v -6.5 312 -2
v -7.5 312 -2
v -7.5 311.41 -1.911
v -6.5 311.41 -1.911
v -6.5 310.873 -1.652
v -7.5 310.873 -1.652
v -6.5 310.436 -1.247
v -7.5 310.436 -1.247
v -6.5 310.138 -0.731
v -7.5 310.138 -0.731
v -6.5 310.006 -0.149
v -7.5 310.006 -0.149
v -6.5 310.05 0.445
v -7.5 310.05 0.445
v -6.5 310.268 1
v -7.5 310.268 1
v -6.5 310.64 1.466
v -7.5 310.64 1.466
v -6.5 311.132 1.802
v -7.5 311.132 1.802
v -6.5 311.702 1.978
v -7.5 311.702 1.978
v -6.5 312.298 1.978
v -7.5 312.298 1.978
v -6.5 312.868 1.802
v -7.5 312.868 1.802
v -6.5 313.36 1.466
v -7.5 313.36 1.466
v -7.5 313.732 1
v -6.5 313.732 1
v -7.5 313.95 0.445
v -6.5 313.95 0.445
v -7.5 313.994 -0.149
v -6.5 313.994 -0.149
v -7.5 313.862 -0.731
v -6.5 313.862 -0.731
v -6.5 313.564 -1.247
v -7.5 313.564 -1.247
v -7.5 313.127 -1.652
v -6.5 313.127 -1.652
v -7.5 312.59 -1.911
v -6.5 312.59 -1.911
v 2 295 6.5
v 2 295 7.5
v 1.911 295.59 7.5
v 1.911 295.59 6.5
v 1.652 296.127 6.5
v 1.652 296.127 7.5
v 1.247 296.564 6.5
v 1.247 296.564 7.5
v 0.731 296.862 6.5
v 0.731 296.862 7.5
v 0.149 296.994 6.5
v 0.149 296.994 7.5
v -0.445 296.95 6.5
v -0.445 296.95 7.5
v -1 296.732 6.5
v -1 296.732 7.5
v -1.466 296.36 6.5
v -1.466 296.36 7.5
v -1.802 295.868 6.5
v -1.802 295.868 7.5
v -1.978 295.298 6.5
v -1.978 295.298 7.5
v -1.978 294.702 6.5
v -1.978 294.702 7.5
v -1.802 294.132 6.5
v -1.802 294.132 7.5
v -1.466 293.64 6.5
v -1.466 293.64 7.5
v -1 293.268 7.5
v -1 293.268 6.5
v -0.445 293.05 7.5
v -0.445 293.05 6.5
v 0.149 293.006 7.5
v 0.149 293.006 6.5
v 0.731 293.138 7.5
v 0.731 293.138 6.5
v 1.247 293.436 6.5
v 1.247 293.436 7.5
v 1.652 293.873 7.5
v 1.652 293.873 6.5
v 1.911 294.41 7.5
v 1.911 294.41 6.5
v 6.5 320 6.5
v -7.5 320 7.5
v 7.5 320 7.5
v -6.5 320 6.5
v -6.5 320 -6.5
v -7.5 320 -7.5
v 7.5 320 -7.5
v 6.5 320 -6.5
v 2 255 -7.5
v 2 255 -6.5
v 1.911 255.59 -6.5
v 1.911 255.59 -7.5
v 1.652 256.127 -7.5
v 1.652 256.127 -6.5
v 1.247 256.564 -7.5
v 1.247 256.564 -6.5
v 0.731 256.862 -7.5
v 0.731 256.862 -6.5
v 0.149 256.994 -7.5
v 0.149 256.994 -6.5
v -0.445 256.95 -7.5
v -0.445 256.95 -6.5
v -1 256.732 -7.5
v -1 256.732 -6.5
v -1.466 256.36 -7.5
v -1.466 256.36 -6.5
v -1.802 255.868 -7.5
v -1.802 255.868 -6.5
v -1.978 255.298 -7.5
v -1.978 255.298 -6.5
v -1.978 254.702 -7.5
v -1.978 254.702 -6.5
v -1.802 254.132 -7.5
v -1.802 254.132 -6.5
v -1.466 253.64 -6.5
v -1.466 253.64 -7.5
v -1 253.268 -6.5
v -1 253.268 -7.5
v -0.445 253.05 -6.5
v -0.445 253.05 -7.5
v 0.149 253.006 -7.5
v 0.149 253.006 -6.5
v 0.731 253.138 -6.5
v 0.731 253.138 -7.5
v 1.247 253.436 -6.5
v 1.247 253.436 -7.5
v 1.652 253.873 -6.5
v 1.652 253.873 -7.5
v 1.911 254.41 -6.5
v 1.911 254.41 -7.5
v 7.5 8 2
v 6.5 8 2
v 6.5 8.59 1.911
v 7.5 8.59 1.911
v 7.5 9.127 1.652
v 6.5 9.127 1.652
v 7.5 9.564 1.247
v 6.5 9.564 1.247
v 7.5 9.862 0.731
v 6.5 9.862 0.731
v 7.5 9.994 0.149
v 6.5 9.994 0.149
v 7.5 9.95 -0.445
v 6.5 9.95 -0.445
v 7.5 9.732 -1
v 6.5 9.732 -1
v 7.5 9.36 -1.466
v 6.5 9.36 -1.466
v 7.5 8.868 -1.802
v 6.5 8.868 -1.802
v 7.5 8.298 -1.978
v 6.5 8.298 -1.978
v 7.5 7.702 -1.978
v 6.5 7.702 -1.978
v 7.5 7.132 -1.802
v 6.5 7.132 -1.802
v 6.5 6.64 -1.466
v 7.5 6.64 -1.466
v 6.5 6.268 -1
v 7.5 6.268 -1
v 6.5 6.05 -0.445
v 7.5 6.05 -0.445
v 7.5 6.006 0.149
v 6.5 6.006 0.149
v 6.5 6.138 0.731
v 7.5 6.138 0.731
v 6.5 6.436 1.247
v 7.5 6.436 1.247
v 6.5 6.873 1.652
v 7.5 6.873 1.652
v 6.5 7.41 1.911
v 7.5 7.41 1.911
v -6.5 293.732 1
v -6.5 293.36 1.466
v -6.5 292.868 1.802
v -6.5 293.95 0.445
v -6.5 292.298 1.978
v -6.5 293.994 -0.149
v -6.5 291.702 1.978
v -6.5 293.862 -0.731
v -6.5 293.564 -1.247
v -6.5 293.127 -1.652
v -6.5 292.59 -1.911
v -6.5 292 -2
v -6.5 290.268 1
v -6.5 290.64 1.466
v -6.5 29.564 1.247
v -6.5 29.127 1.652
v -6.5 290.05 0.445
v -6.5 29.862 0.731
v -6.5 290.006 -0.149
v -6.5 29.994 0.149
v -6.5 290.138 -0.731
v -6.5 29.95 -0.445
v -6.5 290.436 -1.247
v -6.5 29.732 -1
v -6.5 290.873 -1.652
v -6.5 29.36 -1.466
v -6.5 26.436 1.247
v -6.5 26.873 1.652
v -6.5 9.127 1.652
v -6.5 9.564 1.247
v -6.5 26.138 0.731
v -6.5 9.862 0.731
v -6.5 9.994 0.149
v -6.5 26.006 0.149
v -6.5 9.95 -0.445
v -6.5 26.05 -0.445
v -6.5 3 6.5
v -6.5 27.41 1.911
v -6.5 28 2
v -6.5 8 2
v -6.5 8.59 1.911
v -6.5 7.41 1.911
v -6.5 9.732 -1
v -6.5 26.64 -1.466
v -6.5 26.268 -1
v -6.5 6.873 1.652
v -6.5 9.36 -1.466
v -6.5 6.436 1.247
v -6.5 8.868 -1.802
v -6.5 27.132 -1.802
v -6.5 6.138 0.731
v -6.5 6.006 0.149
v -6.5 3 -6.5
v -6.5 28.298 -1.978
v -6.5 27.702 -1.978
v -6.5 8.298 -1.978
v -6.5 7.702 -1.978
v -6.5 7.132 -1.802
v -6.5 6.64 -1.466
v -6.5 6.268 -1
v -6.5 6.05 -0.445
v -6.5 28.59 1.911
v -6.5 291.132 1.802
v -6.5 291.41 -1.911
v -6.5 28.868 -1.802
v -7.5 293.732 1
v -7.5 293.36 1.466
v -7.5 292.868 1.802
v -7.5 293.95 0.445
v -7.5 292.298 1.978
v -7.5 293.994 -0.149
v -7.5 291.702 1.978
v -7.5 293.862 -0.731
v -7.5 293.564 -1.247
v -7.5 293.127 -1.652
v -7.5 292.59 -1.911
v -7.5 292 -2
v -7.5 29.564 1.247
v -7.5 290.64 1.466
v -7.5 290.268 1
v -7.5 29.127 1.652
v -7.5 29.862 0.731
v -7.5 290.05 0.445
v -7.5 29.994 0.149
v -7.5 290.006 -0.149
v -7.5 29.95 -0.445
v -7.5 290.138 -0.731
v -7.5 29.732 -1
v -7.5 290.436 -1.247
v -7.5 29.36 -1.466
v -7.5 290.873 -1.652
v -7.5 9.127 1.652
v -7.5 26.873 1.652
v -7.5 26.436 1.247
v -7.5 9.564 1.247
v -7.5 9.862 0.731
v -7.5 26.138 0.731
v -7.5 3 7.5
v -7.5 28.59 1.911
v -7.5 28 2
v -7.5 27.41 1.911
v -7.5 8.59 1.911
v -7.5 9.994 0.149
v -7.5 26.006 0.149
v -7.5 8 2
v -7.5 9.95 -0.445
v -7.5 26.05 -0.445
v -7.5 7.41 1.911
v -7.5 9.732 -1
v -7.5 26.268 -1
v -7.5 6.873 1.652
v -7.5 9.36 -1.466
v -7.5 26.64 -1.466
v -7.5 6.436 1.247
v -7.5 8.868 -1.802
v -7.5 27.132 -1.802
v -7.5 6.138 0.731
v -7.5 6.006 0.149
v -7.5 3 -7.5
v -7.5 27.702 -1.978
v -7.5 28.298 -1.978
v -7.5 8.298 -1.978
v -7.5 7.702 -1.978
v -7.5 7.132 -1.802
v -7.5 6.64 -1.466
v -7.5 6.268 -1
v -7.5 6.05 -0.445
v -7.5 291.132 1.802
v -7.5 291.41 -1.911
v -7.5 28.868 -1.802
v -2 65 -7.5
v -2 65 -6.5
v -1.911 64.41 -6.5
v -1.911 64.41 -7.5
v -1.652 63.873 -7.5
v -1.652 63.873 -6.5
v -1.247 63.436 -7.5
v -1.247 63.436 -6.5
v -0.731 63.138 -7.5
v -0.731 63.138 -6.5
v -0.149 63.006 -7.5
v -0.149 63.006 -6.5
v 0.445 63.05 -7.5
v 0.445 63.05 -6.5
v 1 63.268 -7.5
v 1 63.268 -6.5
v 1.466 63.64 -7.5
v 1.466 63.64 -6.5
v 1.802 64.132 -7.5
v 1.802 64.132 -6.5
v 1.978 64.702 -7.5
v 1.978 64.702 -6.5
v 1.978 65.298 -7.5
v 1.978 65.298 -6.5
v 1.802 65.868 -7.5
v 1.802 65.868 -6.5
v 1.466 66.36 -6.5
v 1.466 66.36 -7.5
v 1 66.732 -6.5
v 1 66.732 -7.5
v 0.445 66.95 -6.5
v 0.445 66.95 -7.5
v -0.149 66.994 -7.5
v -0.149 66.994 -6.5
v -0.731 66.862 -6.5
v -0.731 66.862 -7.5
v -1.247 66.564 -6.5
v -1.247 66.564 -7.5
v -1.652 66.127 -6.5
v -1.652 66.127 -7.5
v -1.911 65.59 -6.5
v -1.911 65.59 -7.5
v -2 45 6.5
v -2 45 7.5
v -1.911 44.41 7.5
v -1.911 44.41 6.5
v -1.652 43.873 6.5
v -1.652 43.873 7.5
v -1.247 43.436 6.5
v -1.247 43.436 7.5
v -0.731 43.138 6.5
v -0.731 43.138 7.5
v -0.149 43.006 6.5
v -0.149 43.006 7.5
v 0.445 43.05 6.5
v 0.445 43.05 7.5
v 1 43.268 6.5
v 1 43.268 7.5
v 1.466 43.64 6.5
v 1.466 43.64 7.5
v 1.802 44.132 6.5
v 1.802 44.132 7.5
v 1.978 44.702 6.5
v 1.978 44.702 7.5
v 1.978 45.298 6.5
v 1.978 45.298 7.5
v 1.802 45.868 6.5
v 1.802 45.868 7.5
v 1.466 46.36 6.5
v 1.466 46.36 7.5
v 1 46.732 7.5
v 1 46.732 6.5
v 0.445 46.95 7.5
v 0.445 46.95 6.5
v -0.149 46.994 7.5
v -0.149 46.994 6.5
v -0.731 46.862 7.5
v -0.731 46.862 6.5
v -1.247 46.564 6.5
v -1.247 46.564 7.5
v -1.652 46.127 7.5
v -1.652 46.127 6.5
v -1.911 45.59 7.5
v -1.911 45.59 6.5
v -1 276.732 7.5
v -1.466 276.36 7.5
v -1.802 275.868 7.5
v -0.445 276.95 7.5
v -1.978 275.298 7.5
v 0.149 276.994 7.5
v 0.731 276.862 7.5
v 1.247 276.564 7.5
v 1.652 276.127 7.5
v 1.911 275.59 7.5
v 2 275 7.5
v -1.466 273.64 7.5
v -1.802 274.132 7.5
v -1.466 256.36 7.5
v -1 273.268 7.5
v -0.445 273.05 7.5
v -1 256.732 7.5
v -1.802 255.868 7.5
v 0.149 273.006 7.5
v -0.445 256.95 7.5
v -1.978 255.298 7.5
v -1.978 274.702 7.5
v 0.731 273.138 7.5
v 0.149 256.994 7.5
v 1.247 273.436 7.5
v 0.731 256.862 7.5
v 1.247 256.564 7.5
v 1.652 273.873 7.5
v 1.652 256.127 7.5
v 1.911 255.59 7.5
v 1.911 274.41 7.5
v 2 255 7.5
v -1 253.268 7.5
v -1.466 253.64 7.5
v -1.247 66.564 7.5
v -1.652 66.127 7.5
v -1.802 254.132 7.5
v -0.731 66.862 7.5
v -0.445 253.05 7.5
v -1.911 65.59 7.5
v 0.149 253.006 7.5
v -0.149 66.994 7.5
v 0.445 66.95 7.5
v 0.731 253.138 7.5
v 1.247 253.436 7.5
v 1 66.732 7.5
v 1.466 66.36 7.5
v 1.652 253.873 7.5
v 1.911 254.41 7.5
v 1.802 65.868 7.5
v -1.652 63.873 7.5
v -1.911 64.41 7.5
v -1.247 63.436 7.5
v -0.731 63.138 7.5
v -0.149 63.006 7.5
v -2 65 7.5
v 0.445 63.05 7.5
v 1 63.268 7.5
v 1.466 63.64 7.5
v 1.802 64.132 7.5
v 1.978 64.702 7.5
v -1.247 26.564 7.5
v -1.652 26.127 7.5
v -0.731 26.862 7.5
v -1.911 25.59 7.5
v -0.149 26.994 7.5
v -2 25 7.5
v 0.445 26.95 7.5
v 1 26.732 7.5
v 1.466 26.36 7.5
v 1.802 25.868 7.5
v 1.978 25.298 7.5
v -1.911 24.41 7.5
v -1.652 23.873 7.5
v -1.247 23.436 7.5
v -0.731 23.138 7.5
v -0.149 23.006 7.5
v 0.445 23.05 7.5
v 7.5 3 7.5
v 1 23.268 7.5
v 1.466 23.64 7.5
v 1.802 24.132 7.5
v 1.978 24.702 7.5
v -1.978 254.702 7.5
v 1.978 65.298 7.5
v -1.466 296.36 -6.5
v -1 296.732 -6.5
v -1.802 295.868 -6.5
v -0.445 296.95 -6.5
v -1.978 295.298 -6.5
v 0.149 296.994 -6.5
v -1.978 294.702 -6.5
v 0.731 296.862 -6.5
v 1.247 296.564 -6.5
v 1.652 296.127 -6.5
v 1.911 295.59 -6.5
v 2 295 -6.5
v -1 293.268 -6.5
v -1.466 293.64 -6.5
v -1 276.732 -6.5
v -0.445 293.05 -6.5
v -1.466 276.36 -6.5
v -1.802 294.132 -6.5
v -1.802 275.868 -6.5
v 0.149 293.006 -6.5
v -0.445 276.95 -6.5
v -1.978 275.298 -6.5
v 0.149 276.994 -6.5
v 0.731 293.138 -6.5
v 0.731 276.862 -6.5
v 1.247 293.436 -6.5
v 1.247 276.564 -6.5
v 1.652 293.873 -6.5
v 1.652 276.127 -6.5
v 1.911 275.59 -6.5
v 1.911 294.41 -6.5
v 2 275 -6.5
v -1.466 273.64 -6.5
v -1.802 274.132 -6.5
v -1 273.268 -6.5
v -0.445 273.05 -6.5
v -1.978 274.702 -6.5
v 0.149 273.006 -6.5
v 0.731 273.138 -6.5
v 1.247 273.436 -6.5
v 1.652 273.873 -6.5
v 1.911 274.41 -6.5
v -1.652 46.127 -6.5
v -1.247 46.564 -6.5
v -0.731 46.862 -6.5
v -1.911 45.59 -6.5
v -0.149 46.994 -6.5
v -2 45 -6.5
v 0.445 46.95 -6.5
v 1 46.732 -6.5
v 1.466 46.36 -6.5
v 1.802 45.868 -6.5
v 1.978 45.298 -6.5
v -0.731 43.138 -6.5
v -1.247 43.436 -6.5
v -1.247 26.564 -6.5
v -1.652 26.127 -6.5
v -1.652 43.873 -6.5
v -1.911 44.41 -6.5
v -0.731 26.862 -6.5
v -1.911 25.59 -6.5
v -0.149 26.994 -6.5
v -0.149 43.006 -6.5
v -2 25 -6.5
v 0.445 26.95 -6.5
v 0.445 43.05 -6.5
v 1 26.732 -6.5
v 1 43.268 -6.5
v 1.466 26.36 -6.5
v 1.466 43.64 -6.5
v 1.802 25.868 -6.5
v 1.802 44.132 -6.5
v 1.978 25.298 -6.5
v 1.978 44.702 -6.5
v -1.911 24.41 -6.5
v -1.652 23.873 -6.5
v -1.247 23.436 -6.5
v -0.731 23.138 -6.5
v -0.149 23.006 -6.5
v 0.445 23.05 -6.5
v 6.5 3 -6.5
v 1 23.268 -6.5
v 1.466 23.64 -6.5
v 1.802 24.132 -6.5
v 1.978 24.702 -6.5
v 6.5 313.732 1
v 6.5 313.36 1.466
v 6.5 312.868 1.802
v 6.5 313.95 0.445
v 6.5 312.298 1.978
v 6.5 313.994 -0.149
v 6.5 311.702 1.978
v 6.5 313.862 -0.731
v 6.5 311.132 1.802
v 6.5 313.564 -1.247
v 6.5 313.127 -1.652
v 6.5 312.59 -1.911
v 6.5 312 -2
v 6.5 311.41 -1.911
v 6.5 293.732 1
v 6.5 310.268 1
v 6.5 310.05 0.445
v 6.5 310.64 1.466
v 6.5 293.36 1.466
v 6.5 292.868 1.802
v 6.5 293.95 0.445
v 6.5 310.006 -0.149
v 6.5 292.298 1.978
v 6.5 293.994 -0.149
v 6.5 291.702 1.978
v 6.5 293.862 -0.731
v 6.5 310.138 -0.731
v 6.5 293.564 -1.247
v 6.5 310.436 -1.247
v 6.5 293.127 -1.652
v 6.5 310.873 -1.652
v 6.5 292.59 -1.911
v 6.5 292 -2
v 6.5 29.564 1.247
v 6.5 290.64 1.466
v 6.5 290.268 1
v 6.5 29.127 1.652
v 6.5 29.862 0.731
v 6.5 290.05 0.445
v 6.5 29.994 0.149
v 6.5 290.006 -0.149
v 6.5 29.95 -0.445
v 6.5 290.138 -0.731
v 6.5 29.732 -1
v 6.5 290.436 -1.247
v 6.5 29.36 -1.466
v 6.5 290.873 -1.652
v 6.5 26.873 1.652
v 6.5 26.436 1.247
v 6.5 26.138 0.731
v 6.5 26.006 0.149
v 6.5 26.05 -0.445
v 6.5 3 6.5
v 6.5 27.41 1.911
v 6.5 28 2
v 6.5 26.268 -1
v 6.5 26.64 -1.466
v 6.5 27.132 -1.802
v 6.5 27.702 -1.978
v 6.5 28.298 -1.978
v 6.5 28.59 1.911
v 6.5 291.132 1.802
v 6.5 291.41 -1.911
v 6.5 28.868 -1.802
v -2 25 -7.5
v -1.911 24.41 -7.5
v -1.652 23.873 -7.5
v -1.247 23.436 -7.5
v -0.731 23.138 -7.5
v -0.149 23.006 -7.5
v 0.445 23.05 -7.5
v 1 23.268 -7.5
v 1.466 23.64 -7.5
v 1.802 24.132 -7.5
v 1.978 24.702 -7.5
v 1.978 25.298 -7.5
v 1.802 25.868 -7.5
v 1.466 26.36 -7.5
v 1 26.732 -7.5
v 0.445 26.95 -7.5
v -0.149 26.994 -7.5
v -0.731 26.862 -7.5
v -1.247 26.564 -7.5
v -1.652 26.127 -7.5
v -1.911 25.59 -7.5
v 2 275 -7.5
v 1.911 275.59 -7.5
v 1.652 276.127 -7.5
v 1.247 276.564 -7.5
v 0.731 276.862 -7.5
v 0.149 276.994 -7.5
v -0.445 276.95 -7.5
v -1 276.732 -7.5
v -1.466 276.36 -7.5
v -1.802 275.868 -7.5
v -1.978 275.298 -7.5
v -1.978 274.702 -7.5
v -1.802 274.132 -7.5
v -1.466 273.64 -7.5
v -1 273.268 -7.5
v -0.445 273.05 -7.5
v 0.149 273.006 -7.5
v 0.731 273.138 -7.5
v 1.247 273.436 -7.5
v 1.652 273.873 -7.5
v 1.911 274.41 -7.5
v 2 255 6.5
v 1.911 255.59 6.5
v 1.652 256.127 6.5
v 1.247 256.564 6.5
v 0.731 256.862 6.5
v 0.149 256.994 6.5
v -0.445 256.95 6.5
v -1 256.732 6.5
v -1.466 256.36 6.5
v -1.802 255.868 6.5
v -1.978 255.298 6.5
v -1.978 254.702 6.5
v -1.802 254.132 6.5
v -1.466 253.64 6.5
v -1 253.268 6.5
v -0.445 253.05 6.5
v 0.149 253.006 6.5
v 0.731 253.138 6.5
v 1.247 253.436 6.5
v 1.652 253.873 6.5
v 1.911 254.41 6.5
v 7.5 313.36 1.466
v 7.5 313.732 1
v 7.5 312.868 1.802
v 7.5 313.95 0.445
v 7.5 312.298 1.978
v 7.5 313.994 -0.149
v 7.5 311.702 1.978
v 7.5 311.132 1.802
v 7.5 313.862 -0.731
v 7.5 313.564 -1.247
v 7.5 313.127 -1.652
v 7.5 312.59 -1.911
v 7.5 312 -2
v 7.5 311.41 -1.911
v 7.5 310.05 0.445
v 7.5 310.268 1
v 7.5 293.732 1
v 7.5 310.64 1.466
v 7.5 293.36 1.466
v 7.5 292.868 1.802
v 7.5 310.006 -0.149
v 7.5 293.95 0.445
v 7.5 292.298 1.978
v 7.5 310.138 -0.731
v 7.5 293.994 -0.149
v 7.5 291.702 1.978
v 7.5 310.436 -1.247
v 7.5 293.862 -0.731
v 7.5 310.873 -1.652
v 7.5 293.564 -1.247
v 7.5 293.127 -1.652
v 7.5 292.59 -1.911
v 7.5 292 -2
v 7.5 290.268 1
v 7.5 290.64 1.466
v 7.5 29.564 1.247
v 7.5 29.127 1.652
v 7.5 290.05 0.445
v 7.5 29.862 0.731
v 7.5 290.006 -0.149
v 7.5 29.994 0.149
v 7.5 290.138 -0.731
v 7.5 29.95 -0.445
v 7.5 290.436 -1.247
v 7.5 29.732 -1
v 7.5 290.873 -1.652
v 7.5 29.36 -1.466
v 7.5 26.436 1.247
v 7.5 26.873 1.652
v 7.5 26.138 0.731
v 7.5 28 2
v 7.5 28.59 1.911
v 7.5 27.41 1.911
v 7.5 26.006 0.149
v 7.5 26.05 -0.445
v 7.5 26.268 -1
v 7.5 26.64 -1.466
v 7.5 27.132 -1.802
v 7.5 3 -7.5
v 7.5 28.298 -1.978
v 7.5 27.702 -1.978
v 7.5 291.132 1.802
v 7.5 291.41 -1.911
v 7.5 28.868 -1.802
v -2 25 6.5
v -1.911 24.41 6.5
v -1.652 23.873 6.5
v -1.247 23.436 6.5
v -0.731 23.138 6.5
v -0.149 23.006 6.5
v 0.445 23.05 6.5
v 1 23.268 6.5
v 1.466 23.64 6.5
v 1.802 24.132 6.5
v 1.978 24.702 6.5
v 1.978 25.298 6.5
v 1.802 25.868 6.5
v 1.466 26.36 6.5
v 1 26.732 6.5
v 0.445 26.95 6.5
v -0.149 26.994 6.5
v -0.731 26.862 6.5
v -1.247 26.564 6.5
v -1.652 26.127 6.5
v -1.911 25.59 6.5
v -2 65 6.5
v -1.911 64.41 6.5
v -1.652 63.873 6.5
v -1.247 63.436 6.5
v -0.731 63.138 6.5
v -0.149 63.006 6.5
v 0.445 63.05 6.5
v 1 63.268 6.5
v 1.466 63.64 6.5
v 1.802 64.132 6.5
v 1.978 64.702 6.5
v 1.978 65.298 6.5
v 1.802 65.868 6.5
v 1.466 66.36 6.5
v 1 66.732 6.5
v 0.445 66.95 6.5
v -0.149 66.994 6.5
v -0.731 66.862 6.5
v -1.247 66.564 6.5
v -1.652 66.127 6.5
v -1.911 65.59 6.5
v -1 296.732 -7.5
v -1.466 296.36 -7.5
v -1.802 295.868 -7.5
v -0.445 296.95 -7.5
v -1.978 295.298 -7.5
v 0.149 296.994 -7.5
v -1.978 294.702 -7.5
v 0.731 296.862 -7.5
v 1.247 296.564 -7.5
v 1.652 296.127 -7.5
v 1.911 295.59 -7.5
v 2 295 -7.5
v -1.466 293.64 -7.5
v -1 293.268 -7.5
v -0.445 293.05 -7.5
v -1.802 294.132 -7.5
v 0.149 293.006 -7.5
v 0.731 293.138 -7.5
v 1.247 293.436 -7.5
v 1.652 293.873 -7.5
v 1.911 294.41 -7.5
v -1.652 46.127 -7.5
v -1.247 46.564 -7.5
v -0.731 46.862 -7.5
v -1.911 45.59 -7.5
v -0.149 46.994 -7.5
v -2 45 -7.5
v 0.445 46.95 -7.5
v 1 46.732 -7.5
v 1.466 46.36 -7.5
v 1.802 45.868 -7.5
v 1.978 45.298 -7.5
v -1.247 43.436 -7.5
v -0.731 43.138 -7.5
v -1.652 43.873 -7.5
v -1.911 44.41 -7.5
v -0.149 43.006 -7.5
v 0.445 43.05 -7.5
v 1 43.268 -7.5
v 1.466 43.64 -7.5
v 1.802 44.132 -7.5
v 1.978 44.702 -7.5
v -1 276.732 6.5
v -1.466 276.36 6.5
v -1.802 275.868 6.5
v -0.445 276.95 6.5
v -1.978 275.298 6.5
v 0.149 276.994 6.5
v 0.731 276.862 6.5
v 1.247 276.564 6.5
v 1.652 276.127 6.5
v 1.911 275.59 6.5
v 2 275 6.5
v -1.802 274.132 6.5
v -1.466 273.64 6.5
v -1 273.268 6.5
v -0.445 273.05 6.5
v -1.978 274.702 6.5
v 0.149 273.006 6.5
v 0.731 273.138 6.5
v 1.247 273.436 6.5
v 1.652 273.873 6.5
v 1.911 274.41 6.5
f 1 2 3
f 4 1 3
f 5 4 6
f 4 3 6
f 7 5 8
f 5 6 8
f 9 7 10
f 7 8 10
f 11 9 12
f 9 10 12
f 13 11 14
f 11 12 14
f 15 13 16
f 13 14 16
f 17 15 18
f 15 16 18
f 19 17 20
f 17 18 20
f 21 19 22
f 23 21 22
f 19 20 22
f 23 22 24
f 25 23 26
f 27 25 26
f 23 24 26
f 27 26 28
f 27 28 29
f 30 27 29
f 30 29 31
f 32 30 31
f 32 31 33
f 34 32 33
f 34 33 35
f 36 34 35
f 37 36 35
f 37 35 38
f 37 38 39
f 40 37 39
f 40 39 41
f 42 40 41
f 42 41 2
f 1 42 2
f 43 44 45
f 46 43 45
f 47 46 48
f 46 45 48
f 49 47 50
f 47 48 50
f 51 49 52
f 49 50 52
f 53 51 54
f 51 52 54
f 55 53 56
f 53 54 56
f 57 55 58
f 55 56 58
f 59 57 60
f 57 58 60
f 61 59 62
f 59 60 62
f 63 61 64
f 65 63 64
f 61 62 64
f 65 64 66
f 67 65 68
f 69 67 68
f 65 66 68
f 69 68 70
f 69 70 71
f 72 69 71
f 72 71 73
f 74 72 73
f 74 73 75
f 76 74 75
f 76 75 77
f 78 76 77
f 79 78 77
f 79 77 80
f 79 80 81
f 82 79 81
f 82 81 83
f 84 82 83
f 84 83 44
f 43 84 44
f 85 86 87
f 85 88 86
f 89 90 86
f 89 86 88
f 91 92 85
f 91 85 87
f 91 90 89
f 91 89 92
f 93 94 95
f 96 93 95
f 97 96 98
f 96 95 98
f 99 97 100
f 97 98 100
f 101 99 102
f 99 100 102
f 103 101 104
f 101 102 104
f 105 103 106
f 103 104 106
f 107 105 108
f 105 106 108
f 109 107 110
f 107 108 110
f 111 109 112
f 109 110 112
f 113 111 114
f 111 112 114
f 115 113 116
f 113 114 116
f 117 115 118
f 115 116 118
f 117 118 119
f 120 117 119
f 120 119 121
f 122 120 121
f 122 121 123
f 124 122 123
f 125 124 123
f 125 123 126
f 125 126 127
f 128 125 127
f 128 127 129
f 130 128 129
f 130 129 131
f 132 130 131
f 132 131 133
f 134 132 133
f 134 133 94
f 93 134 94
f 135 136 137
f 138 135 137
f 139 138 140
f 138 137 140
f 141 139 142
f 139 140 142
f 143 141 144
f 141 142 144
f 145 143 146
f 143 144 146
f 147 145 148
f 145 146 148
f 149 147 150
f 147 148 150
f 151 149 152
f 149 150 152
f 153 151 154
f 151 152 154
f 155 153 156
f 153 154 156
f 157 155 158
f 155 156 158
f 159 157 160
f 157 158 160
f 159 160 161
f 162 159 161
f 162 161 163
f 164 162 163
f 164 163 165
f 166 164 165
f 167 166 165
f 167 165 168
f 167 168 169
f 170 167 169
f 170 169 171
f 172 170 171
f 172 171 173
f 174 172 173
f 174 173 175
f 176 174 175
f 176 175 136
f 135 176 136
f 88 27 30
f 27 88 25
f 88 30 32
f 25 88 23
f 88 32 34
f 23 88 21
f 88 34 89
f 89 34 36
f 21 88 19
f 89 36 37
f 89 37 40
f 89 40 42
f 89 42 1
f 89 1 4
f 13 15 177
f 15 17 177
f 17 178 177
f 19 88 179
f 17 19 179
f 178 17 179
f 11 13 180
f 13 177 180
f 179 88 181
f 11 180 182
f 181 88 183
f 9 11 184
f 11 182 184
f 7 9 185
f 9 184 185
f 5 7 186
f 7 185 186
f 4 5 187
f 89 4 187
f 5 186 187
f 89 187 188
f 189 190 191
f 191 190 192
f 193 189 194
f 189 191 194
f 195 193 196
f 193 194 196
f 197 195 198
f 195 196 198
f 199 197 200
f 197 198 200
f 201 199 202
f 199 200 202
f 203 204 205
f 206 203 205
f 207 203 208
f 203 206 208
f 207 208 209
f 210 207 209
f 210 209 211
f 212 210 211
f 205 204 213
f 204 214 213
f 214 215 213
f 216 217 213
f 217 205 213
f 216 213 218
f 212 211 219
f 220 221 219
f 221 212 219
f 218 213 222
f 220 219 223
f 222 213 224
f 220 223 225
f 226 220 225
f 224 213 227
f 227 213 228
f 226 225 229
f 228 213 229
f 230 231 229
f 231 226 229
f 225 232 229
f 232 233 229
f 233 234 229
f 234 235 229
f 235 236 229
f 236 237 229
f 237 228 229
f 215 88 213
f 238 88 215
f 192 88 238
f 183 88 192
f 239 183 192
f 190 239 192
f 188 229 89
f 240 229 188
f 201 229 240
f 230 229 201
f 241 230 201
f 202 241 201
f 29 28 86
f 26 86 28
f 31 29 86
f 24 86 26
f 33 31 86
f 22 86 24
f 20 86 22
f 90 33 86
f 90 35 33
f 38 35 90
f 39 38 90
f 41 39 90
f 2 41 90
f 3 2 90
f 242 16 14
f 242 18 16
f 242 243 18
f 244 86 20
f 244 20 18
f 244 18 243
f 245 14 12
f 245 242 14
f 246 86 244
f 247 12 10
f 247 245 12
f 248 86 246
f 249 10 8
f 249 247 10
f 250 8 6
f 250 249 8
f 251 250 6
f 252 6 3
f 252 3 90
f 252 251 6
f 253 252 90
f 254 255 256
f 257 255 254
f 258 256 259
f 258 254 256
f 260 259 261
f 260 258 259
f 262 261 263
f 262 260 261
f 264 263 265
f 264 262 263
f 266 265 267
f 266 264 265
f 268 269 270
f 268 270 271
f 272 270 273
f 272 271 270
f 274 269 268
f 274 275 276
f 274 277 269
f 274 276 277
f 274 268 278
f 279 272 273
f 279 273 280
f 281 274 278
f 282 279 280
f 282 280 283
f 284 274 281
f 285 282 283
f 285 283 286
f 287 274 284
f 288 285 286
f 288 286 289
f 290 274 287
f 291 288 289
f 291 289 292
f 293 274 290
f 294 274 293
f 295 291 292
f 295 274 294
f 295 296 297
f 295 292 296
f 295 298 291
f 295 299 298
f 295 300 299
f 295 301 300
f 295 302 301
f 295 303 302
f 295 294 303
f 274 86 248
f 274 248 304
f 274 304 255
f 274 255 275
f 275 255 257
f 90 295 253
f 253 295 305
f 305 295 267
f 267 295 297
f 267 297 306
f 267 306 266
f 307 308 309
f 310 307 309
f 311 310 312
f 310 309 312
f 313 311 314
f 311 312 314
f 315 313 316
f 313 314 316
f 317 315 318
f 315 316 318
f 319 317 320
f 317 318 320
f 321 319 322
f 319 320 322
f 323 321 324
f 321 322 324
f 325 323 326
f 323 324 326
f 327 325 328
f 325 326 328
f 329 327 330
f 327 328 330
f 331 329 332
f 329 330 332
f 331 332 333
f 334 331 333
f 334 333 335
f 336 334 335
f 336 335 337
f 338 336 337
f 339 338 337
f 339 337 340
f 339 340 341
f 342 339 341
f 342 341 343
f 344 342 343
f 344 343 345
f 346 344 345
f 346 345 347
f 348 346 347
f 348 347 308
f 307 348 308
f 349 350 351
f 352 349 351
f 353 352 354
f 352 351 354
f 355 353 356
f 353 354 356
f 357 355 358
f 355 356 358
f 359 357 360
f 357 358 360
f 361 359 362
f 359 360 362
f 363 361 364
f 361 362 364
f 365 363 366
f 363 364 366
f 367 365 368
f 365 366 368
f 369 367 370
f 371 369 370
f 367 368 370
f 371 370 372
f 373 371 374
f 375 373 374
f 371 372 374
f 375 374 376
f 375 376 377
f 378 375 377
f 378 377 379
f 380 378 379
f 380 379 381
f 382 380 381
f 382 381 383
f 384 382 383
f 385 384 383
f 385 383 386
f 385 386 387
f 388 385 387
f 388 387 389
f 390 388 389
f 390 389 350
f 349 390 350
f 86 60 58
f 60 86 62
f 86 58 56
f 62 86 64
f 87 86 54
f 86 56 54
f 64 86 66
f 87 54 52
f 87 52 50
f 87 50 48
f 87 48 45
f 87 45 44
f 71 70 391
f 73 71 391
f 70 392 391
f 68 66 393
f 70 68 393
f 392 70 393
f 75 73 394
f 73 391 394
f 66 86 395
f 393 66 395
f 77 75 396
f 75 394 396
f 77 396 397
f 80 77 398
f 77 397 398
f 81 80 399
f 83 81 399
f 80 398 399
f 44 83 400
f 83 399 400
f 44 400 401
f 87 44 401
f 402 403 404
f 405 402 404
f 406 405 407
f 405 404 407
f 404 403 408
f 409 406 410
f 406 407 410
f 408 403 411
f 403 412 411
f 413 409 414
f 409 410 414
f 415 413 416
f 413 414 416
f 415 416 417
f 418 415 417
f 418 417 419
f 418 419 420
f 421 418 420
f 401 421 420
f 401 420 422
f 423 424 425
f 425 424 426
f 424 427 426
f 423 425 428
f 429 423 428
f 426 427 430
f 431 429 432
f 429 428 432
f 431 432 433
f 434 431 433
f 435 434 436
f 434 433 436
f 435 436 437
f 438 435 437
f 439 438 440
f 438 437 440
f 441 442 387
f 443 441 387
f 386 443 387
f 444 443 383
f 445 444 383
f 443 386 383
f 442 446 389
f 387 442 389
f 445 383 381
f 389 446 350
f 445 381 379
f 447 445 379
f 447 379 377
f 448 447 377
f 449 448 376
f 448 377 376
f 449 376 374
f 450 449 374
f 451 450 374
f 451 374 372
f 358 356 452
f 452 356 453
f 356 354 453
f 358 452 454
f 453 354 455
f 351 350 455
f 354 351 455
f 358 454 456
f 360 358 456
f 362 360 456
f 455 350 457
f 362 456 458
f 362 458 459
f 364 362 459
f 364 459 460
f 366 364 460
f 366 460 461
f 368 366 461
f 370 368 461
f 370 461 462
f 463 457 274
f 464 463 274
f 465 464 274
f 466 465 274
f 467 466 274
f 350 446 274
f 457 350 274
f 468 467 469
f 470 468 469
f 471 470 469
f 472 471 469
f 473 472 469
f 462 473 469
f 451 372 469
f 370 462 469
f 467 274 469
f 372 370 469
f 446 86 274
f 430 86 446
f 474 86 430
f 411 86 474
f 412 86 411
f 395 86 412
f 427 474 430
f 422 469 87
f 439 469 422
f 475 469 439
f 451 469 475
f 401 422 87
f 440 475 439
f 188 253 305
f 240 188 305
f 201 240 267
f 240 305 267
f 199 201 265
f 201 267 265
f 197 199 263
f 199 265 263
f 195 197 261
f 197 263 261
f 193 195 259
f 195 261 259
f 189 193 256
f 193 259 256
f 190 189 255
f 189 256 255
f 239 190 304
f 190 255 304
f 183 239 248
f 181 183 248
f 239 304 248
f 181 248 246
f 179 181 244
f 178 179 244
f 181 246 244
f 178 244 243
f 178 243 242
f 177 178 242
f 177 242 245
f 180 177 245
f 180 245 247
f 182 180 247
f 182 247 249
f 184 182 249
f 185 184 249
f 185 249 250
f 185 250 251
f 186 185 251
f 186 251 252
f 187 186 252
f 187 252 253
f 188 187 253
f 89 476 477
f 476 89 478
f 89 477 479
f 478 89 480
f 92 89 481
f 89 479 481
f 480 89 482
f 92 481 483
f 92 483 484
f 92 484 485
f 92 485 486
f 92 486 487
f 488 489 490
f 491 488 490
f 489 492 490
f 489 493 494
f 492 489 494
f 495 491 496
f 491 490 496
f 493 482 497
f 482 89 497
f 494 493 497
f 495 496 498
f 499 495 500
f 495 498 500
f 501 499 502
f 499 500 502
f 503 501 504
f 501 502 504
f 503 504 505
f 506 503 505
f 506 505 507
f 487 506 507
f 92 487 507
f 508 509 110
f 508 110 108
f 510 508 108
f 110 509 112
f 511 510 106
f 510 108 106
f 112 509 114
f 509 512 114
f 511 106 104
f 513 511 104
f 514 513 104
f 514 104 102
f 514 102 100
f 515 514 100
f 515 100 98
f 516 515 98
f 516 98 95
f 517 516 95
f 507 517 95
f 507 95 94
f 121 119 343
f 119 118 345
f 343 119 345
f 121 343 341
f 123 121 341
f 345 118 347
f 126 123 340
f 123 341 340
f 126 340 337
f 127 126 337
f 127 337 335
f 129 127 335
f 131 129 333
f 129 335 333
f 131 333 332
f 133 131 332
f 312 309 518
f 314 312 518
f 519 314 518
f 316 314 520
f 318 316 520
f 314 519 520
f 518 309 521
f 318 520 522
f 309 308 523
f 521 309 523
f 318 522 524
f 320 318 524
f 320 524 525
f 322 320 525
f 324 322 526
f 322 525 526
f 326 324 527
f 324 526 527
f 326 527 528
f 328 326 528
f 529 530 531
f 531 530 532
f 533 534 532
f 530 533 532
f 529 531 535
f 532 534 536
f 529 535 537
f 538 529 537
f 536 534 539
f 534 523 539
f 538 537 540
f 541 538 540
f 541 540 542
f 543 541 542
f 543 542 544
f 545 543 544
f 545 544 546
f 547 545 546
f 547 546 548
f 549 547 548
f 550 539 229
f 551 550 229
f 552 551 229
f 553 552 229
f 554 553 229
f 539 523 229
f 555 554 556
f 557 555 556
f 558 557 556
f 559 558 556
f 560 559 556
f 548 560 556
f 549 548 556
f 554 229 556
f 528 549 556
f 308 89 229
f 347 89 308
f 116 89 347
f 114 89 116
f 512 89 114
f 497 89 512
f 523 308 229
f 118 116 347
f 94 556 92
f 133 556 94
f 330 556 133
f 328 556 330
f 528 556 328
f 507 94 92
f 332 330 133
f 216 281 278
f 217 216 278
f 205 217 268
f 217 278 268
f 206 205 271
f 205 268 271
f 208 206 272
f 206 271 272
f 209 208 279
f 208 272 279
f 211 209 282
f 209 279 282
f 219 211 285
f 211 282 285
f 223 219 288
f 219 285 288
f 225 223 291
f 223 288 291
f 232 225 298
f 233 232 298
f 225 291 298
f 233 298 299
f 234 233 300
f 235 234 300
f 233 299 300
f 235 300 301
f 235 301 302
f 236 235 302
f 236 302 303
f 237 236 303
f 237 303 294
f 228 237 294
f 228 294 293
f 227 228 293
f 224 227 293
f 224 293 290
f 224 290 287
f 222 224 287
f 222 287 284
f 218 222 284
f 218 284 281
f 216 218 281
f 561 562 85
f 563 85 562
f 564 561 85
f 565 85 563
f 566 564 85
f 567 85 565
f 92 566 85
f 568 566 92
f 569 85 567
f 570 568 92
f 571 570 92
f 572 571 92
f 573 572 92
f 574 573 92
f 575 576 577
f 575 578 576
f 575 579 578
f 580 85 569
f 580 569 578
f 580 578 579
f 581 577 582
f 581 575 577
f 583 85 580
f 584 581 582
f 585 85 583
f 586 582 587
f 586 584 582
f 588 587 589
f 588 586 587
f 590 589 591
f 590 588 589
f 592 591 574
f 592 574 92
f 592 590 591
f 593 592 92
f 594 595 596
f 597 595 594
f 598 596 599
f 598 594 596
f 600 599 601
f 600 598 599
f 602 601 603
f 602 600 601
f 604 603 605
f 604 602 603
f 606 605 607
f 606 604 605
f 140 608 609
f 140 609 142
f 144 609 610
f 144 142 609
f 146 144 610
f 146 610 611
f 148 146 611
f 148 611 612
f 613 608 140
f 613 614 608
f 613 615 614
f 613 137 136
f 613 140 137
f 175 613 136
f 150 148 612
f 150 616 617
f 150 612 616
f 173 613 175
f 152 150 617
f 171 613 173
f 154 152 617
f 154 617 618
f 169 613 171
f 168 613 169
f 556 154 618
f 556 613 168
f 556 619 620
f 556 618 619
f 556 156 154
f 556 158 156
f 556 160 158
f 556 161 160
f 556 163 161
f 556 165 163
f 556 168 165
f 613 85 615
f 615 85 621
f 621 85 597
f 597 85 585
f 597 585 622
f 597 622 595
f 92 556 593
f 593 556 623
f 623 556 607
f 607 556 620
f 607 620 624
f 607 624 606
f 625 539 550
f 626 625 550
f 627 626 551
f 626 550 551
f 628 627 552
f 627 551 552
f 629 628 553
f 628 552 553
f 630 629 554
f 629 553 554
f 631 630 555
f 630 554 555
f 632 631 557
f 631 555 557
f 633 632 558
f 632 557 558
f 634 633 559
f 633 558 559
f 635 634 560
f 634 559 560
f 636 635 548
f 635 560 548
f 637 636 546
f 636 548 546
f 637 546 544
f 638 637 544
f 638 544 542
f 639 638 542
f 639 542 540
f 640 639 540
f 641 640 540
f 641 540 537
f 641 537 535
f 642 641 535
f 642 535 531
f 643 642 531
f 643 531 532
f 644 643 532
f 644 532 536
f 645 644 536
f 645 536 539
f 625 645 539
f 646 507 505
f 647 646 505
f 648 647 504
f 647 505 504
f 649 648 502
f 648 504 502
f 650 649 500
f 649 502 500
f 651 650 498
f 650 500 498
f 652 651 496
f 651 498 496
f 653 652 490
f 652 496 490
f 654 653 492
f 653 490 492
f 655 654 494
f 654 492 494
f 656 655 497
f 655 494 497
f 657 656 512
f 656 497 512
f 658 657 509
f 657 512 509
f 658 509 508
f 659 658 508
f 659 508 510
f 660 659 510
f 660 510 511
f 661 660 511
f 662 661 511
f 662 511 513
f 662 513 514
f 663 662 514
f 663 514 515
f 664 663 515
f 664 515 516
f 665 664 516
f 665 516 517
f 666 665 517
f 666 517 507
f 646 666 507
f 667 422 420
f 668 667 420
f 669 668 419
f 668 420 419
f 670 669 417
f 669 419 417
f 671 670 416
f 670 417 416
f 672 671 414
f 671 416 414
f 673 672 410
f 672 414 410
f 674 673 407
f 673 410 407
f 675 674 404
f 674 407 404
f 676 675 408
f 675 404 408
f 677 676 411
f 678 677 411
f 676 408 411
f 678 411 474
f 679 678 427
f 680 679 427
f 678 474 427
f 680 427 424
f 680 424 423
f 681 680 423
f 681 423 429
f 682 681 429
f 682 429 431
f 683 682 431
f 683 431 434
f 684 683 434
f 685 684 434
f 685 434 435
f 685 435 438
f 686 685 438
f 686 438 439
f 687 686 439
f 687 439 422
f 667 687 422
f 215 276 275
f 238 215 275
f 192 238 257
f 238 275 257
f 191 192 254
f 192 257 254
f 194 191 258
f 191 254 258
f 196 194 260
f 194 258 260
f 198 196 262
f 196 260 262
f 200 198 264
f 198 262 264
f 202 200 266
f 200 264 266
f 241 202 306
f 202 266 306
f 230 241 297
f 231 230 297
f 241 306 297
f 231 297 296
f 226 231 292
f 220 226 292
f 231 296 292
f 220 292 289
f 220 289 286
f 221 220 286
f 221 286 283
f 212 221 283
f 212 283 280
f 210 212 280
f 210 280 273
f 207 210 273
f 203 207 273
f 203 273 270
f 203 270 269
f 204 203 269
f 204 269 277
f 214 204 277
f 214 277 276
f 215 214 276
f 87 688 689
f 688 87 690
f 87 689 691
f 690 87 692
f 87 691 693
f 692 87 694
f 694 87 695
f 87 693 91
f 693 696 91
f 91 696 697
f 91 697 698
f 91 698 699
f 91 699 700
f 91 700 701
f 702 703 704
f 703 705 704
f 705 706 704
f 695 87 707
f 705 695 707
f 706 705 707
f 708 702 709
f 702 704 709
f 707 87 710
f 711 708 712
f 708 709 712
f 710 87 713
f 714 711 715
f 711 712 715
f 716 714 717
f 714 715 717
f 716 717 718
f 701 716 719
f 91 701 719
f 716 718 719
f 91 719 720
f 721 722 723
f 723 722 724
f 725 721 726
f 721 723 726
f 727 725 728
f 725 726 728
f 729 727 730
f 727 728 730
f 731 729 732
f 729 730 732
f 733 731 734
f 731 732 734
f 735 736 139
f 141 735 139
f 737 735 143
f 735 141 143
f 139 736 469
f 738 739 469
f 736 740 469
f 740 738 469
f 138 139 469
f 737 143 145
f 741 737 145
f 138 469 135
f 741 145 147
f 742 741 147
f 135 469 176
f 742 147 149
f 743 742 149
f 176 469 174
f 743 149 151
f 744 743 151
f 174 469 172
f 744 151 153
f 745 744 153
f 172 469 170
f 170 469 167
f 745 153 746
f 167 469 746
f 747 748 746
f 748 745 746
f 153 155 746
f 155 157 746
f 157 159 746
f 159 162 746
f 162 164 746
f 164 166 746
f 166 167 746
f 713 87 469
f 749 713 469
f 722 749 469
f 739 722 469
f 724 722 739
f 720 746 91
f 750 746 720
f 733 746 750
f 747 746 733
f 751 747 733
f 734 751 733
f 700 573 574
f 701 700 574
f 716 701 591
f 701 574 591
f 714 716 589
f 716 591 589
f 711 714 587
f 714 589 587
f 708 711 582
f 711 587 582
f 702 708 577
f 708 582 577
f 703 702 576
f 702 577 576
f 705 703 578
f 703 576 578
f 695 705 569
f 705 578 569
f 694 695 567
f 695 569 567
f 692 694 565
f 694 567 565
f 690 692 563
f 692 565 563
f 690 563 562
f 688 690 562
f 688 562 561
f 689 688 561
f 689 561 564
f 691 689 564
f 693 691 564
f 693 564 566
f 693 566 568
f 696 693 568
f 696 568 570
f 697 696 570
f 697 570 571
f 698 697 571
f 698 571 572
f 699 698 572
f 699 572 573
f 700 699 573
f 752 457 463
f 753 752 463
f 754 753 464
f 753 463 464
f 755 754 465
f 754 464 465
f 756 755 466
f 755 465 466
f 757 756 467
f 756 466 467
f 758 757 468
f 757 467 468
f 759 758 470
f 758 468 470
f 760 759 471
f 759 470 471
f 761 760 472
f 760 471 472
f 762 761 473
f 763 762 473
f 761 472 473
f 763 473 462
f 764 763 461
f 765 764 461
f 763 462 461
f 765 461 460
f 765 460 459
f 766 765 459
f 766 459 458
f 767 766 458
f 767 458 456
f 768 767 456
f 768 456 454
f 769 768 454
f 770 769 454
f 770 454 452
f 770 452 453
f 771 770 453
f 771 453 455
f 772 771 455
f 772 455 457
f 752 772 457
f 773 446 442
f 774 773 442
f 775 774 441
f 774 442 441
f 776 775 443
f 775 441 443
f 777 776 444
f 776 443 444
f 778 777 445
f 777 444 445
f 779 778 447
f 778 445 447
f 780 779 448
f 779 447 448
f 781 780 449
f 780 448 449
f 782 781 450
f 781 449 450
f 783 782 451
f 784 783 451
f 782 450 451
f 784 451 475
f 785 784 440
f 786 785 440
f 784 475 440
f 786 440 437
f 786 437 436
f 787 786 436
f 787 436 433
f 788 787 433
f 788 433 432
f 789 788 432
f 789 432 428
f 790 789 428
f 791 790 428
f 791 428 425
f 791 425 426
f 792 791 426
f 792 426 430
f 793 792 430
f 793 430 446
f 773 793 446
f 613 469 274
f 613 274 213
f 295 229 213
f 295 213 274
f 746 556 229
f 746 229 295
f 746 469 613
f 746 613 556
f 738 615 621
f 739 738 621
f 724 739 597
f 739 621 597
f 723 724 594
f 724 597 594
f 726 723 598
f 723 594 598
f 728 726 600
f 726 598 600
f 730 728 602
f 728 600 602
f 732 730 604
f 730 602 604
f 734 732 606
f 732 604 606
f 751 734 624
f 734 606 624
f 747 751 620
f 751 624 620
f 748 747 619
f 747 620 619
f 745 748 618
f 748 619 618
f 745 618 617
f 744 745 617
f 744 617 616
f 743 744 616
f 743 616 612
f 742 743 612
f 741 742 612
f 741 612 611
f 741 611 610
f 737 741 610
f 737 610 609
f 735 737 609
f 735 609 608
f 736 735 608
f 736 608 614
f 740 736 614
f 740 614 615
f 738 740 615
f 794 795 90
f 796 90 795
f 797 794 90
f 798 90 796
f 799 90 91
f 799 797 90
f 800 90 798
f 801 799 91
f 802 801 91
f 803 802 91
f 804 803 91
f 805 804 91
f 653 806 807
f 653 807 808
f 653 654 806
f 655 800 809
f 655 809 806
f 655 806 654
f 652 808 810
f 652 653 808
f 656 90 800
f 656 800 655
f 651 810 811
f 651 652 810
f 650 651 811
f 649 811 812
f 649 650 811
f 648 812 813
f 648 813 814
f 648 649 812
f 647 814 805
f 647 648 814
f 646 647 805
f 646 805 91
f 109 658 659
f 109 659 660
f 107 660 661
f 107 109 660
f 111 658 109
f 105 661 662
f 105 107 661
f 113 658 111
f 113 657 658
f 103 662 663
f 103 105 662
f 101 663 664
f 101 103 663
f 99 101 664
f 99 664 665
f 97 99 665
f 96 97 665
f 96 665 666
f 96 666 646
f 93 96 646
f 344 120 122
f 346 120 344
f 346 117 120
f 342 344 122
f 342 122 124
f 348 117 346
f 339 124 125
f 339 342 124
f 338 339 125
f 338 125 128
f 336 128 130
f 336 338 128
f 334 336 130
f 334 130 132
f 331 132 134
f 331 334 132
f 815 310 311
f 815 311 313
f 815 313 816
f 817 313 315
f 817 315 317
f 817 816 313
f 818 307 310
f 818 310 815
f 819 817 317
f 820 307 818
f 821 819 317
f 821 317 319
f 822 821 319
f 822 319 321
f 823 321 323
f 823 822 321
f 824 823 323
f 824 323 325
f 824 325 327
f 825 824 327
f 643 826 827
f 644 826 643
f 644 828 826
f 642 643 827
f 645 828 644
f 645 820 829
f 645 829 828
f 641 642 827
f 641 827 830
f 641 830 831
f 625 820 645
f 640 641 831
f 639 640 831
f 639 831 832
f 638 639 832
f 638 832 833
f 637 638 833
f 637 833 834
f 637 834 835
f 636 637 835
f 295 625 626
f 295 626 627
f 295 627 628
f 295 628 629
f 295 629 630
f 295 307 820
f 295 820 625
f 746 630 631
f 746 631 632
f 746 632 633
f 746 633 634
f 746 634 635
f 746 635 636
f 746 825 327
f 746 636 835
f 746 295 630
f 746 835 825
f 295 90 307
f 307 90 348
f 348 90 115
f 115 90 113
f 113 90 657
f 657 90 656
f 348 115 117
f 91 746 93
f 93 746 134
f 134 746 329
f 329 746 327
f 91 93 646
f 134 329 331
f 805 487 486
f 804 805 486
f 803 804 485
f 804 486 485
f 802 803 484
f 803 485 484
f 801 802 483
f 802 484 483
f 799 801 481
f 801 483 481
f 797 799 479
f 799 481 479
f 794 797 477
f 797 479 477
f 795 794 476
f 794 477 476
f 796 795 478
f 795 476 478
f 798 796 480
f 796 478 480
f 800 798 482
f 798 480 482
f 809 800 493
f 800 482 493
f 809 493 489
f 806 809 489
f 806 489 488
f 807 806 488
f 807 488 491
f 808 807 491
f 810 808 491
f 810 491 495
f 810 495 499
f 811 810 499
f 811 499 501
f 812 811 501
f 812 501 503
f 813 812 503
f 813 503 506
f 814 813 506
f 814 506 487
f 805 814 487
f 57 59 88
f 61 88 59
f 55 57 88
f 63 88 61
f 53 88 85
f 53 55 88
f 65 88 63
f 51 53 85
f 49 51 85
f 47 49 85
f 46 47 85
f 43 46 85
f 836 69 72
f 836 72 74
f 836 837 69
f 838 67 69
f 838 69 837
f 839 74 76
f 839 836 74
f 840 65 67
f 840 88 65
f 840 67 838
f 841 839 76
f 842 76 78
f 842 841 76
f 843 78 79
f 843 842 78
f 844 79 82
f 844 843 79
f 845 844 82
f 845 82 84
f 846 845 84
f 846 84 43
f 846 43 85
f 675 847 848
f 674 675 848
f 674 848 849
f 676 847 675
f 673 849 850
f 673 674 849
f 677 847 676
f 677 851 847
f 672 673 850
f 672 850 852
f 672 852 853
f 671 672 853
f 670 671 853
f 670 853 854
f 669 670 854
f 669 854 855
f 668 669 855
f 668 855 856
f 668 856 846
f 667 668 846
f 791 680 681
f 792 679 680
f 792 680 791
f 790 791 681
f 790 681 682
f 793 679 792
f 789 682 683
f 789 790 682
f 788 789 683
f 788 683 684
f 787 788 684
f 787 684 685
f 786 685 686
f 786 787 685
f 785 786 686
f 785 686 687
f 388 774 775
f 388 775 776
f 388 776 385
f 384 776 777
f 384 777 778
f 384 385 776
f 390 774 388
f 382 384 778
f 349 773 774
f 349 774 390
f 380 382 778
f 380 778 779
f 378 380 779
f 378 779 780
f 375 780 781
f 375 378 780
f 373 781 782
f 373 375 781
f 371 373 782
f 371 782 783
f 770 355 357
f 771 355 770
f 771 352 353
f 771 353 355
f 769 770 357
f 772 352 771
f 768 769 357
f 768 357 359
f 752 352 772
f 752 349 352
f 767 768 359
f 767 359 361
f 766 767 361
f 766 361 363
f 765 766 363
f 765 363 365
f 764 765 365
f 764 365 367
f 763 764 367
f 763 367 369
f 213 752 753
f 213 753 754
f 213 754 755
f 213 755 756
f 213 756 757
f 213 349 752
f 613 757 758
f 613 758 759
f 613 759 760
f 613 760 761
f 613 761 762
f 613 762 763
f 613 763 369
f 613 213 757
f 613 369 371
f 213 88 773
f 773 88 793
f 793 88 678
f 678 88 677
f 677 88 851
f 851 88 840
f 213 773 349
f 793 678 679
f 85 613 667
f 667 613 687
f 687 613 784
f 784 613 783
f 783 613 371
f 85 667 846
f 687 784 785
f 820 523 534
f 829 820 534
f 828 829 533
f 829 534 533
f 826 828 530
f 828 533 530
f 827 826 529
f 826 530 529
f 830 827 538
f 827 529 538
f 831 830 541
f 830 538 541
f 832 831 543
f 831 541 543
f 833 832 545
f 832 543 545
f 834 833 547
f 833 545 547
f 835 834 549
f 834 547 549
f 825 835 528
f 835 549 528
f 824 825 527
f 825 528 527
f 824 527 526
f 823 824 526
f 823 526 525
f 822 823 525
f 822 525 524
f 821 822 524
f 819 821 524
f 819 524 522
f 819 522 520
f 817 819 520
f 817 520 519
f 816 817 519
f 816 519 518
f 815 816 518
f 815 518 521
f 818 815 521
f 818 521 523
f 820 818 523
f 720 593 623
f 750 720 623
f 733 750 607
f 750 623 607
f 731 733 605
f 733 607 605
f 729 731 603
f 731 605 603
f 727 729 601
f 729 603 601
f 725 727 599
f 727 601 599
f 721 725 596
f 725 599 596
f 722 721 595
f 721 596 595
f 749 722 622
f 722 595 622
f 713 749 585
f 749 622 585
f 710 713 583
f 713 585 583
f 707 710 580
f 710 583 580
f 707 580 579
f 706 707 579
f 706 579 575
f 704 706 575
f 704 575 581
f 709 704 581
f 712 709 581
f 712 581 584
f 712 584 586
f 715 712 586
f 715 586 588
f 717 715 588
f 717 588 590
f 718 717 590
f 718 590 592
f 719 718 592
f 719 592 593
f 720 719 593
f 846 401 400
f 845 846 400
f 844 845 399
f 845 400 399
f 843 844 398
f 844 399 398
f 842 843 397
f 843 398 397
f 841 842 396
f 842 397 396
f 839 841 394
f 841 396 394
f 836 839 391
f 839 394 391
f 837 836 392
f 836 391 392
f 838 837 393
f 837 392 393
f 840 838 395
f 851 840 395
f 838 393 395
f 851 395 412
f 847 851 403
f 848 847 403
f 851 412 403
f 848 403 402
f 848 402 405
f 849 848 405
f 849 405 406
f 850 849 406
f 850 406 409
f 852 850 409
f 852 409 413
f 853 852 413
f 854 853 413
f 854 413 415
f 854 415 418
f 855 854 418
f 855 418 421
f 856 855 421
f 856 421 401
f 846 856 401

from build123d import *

# Parameters (mm, degrees)
SKETCH_1_W          = 15
SKETCH_1_H          = 15
SKETCH_1_W_2        = 13
SKETCH_1_H_2        = 13
EXTRUDE_1_DEPTH     = 320
SKETCH_3_R          = 2
CUT_EXTRUDE_2_DEPTH = 321.43915179
SKETCH_4_R          = 2
CUT_EXTRUDE_3_DEPTH = 321.43915179
SKETCH_7_W          = 15
SKETCH_7_H          = 3
CUT_EXTRUDE_6_DEPTH = 20


with BuildPart() as part:
    # 草图1 → 凸台-拉伸1 (new body)
    with BuildSketch(Plane(origin=(0, 0, 0), x_dir=(1, 0, 0), z_dir=(0, 1, 0))):
        Rectangle(SKETCH_1_W, SKETCH_1_H)
        Rectangle(SKETCH_1_W_2, SKETCH_1_H_2, mode=Mode.SUBTRACT)
    extrude(amount=EXTRUDE_1_DEPTH)

    # 草图3 → 切除-拉伸2 (cut, through all)
    with BuildSketch(Plane.XY.offset(7.5)):
        with Locations((0, 295)):
            Circle(SKETCH_3_R)
        with Locations((0, 275)):
            Circle(SKETCH_3_R)
        with Locations(Location((0, 45, 0), (0, 0, 180))):
            Circle(SKETCH_3_R)
        with Locations(Location((0, 25, 0), (0, 0, 180))):
            Circle(SKETCH_3_R)
        with Locations((0, 255)):
            Circle(SKETCH_3_R)
        with Locations(Location((0, 65, 0), (0, 0, 180))):
            Circle(SKETCH_3_R)
    extrude(amount=-CUT_EXTRUDE_2_DEPTH, mode=Mode.SUBTRACT)

    # 草图4 → 切除-拉伸3 (cut, through all)
    with BuildSketch(Plane.ZY.offset(7.5)):
        with Locations((0, 8)):
            Circle(SKETCH_4_R)
        with Locations((0, 28)):
            Circle(SKETCH_4_R)
        with Locations(Location((0, 292, 0), (0, 0, 180))):
            Circle(SKETCH_4_R)
        with Locations(Location((0, 312, 0), (0, 0, 180))):
            Circle(SKETCH_4_R)
    extrude(amount=-CUT_EXTRUDE_3_DEPTH, mode=Mode.SUBTRACT)

    # 草图7 → 切除-拉伸6 (cut)
    with BuildSketch(Plane(origin=(7.5, 0, 0), x_dir=(0, 0, -1), z_dir=(1, 0, 0))):
        with Locations((0, 1.5)):
            Rectangle(SKETCH_7_W, SKETCH_7_H)
    extrude(amount=-CUT_EXTRUDE_6_DEPTH, mode=Mode.SUBTRACT)


solid = part.part
